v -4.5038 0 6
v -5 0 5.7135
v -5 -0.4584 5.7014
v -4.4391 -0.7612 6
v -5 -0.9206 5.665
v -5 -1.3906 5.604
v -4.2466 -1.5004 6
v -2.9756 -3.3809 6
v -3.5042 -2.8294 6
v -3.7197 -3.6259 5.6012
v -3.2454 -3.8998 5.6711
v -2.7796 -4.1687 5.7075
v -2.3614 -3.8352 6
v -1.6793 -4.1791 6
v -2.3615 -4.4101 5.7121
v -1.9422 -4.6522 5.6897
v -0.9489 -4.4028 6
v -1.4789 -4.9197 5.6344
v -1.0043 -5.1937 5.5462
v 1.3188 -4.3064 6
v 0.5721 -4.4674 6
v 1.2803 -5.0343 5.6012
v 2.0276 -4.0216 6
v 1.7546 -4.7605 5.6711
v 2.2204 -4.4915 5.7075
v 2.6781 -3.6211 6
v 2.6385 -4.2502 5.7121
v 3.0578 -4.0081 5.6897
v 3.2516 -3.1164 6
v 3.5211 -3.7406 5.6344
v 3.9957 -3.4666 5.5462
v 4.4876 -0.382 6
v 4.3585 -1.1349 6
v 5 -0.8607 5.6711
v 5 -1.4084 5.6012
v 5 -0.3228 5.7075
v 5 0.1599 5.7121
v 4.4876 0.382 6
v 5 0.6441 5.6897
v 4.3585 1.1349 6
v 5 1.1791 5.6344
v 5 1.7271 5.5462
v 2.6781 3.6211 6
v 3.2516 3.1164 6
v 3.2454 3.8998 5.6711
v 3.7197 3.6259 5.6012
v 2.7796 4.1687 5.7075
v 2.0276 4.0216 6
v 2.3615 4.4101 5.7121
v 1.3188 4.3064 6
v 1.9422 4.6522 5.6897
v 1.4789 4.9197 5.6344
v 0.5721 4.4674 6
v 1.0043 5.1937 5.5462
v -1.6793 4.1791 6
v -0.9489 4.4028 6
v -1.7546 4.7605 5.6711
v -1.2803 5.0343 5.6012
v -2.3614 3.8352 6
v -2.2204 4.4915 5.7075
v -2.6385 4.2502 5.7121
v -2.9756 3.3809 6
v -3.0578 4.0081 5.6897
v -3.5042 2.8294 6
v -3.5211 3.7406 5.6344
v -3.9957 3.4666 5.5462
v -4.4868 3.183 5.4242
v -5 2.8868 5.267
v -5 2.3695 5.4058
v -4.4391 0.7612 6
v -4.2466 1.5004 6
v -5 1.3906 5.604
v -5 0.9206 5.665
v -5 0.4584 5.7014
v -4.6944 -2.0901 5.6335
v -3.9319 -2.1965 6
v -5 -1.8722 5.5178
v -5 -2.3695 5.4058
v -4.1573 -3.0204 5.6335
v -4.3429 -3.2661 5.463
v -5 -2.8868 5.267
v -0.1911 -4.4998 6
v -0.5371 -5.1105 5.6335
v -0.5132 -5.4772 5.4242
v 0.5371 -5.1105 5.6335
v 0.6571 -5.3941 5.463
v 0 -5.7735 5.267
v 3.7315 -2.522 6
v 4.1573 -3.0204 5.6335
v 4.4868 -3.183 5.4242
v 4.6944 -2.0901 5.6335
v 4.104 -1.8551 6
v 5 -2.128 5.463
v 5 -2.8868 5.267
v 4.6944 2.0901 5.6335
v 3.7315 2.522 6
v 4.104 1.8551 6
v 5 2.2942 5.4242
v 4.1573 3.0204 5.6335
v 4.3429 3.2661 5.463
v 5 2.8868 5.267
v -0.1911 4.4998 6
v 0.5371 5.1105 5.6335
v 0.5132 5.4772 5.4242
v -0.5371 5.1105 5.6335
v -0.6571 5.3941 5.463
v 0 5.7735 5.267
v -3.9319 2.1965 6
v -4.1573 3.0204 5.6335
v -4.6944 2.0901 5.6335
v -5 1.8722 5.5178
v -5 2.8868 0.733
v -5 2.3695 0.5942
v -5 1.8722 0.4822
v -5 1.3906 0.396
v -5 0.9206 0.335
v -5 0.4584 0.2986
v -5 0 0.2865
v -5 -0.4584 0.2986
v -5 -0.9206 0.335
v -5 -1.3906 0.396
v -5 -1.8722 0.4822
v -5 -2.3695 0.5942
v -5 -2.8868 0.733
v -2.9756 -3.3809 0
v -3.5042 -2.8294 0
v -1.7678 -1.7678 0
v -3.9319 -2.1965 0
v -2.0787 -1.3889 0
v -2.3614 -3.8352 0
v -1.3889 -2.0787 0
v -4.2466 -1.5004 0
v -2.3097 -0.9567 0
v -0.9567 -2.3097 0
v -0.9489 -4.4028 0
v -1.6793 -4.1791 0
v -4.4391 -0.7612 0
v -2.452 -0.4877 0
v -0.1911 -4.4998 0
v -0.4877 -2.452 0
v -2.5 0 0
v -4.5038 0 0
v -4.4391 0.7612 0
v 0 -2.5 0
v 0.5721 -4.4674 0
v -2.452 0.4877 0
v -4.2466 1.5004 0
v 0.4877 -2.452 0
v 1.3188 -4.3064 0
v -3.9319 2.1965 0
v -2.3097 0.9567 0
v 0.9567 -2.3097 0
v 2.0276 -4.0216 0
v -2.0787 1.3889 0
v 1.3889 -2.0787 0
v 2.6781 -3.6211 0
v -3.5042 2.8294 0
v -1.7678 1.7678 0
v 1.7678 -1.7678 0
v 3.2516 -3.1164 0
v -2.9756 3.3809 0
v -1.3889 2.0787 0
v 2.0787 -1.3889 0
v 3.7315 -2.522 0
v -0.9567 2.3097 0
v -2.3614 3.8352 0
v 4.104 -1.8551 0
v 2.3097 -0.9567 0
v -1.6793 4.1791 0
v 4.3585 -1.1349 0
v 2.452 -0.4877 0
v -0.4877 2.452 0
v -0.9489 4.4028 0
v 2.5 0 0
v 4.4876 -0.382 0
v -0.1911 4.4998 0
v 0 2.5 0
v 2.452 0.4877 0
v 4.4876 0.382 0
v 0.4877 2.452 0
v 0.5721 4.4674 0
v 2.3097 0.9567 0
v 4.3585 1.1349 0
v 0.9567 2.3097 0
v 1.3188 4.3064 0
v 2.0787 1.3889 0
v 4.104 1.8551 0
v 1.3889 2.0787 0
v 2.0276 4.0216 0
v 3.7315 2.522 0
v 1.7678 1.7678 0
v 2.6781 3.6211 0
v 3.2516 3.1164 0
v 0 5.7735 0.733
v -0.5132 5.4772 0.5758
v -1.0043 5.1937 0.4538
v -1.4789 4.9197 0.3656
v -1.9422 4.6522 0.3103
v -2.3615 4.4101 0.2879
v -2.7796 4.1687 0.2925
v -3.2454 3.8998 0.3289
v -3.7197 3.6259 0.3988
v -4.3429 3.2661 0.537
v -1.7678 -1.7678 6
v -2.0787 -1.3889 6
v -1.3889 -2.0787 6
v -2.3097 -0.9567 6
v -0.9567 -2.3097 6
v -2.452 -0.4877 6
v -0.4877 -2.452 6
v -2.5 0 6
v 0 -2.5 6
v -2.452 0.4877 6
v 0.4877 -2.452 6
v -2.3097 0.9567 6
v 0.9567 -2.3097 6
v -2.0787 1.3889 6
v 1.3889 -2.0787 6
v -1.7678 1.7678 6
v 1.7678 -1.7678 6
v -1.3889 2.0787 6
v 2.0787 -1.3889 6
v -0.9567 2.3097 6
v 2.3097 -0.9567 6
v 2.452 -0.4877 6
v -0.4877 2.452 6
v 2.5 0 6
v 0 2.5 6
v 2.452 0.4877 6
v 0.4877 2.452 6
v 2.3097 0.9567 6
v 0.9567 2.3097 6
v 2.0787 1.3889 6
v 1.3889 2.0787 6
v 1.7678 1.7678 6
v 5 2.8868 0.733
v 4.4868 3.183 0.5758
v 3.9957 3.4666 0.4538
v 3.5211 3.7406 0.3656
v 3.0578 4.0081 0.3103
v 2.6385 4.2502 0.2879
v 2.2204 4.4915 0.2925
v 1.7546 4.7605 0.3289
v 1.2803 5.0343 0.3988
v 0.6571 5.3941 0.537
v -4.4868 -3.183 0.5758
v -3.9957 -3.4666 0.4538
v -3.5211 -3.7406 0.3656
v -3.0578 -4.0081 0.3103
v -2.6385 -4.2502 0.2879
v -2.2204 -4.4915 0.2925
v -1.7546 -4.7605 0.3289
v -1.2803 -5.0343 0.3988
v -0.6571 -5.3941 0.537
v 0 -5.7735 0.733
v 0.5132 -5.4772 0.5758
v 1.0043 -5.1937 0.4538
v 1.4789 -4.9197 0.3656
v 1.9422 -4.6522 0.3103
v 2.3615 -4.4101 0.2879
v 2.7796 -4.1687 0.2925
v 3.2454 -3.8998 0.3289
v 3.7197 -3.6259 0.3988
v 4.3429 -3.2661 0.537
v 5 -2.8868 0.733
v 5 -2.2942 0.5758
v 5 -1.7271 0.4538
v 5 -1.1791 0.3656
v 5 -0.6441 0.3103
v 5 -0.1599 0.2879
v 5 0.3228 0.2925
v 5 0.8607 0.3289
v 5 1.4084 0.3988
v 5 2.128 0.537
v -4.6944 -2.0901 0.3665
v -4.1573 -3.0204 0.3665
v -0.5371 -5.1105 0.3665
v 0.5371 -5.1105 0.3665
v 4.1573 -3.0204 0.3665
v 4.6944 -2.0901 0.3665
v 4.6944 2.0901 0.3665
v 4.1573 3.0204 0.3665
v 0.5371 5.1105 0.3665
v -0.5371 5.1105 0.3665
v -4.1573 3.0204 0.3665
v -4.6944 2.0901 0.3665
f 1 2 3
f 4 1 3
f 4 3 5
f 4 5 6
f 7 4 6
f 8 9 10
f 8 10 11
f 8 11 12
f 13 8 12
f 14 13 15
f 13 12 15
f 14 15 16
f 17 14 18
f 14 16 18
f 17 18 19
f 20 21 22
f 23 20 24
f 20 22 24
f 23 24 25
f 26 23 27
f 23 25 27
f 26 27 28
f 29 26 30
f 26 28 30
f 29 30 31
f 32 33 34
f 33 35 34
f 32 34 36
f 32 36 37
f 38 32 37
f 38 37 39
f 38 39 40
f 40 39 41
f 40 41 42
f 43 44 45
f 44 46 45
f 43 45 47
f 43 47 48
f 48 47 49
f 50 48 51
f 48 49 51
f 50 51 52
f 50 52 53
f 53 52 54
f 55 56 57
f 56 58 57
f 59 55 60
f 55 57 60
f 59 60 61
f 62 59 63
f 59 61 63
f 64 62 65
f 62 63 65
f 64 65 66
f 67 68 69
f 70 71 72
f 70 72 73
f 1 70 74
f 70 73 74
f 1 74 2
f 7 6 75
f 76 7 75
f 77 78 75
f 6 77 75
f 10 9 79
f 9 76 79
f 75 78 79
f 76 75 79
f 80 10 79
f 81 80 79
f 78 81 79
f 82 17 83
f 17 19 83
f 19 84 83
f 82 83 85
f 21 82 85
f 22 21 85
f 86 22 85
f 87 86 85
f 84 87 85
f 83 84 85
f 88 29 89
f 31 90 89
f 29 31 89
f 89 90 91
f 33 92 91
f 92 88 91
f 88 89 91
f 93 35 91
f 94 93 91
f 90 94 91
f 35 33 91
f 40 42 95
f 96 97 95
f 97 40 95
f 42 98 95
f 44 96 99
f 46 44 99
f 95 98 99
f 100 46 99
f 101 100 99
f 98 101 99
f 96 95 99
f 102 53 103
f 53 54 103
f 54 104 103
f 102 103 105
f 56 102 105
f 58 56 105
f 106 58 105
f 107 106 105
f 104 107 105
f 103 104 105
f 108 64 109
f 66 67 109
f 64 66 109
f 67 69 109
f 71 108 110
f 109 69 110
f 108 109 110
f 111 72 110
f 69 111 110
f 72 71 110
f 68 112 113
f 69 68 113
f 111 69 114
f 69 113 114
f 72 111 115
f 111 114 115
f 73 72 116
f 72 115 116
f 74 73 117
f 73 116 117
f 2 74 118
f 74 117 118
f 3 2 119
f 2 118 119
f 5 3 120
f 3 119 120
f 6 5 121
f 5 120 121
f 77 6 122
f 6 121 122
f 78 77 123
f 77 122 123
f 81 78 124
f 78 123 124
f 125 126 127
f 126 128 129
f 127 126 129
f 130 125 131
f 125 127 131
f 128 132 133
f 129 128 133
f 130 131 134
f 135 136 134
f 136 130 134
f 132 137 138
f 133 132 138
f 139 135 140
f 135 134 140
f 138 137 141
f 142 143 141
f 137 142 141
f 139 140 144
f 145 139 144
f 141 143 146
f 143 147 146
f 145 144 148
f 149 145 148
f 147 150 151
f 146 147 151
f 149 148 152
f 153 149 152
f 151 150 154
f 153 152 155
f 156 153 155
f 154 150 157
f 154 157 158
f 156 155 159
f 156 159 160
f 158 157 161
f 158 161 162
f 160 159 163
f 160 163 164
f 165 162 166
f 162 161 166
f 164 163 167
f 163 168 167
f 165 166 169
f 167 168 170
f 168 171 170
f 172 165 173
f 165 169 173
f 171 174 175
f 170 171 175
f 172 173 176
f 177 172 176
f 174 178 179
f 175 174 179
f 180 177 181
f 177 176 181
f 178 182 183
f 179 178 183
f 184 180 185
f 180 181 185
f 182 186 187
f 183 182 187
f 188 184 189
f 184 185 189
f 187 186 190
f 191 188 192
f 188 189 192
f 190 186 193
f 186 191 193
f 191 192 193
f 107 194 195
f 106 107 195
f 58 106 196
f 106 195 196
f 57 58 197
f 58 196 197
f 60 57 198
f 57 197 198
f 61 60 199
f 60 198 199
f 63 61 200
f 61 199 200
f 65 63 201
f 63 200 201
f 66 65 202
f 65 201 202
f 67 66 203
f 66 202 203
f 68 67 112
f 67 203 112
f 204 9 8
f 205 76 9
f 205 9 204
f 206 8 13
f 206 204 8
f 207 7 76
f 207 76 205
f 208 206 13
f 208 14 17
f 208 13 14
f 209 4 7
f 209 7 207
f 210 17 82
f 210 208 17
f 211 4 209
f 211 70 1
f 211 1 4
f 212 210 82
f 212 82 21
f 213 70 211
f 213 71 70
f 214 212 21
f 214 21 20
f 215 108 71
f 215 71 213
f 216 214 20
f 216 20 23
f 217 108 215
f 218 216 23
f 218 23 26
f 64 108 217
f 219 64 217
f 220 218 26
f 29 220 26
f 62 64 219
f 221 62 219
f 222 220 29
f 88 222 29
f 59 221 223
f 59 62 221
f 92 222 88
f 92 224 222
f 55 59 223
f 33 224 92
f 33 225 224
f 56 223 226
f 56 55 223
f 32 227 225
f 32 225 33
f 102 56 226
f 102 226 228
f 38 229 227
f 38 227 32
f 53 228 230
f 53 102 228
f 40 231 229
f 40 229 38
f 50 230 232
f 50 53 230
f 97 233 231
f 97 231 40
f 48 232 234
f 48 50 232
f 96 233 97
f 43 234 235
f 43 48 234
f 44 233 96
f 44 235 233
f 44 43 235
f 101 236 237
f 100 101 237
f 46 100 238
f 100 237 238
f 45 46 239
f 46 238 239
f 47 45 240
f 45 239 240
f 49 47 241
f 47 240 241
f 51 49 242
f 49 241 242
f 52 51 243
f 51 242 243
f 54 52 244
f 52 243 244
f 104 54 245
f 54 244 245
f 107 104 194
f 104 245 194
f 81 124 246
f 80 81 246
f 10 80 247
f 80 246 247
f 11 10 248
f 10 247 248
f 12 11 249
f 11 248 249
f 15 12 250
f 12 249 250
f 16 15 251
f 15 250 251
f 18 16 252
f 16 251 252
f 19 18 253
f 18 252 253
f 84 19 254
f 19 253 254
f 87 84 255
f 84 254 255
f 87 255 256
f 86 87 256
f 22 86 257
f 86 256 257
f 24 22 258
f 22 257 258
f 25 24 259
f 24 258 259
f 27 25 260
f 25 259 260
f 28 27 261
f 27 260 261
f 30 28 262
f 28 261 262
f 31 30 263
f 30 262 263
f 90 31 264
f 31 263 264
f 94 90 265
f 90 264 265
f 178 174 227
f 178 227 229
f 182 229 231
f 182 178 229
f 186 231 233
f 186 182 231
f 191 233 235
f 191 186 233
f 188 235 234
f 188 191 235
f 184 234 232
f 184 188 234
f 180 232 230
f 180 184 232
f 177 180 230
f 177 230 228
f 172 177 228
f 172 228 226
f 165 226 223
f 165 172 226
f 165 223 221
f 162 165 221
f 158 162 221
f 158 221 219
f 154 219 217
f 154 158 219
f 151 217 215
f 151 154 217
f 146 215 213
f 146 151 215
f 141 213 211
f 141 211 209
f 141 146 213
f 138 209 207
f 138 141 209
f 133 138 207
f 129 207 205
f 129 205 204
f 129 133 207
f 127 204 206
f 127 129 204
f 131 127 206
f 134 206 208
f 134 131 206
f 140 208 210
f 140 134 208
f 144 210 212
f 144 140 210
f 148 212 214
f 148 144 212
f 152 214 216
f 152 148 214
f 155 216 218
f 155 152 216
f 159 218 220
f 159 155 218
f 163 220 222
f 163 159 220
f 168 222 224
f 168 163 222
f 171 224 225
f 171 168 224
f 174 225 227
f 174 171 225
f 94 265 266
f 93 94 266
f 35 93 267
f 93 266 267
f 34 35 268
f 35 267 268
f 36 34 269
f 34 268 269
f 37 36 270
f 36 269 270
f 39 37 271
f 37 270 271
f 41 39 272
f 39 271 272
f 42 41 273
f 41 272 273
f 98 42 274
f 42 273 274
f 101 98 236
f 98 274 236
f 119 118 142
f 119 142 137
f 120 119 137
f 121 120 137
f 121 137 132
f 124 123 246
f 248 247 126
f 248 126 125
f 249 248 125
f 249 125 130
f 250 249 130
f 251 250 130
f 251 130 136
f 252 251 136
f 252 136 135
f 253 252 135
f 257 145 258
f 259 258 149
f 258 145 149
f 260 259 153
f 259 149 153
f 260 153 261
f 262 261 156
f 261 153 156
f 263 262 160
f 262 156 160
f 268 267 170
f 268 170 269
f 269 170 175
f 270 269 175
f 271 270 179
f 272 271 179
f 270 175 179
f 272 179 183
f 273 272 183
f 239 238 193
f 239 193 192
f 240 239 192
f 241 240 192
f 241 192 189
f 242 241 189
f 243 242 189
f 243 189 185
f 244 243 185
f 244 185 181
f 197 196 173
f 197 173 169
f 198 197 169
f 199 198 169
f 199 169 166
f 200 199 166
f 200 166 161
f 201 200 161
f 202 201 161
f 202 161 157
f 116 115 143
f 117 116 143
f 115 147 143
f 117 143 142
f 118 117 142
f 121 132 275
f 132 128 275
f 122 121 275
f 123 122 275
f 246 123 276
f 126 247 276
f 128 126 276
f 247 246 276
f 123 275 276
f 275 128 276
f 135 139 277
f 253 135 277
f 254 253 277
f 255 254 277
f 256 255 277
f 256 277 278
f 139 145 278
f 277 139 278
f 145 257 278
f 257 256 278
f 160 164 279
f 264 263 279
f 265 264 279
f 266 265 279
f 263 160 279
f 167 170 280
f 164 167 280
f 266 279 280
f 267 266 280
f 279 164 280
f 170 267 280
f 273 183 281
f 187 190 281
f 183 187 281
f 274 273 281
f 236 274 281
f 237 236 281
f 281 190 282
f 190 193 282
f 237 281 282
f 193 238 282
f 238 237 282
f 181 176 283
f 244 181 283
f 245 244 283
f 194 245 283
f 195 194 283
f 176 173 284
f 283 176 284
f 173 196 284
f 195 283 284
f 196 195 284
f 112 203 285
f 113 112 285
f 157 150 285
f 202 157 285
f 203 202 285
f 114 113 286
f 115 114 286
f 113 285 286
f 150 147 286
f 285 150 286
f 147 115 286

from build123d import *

# Parameters (mm, degrees)
F0_R     = 2.5
F1_DEPTH = 6


with BuildPart() as f1:
    # F0 (on Top) → F1 (new body)
    with BuildSketch(Plane.XY):
        Polygon((-5, 2.886751), (-5, -2.886751), (0, -5.773503), (5, -2.886751), (5, 2.886751), (0, 5.773503), align=None)
        Circle(F0_R, mode=Mode.SUBTRACT)
    extrude(amount=F1_DEPTH)

    # F2 (on Front) → F3 (revolve, intersect)
    with BuildSketch(Plane.XZ):
        Polygon((0, -2.600298), (0, 8.600298), (-9.7, 3), align=None)
    revolve(axis=Axis((0, 0, 3), (0, 0, 1)), mode=Mode.INTERSECT)


solid = f1.part
